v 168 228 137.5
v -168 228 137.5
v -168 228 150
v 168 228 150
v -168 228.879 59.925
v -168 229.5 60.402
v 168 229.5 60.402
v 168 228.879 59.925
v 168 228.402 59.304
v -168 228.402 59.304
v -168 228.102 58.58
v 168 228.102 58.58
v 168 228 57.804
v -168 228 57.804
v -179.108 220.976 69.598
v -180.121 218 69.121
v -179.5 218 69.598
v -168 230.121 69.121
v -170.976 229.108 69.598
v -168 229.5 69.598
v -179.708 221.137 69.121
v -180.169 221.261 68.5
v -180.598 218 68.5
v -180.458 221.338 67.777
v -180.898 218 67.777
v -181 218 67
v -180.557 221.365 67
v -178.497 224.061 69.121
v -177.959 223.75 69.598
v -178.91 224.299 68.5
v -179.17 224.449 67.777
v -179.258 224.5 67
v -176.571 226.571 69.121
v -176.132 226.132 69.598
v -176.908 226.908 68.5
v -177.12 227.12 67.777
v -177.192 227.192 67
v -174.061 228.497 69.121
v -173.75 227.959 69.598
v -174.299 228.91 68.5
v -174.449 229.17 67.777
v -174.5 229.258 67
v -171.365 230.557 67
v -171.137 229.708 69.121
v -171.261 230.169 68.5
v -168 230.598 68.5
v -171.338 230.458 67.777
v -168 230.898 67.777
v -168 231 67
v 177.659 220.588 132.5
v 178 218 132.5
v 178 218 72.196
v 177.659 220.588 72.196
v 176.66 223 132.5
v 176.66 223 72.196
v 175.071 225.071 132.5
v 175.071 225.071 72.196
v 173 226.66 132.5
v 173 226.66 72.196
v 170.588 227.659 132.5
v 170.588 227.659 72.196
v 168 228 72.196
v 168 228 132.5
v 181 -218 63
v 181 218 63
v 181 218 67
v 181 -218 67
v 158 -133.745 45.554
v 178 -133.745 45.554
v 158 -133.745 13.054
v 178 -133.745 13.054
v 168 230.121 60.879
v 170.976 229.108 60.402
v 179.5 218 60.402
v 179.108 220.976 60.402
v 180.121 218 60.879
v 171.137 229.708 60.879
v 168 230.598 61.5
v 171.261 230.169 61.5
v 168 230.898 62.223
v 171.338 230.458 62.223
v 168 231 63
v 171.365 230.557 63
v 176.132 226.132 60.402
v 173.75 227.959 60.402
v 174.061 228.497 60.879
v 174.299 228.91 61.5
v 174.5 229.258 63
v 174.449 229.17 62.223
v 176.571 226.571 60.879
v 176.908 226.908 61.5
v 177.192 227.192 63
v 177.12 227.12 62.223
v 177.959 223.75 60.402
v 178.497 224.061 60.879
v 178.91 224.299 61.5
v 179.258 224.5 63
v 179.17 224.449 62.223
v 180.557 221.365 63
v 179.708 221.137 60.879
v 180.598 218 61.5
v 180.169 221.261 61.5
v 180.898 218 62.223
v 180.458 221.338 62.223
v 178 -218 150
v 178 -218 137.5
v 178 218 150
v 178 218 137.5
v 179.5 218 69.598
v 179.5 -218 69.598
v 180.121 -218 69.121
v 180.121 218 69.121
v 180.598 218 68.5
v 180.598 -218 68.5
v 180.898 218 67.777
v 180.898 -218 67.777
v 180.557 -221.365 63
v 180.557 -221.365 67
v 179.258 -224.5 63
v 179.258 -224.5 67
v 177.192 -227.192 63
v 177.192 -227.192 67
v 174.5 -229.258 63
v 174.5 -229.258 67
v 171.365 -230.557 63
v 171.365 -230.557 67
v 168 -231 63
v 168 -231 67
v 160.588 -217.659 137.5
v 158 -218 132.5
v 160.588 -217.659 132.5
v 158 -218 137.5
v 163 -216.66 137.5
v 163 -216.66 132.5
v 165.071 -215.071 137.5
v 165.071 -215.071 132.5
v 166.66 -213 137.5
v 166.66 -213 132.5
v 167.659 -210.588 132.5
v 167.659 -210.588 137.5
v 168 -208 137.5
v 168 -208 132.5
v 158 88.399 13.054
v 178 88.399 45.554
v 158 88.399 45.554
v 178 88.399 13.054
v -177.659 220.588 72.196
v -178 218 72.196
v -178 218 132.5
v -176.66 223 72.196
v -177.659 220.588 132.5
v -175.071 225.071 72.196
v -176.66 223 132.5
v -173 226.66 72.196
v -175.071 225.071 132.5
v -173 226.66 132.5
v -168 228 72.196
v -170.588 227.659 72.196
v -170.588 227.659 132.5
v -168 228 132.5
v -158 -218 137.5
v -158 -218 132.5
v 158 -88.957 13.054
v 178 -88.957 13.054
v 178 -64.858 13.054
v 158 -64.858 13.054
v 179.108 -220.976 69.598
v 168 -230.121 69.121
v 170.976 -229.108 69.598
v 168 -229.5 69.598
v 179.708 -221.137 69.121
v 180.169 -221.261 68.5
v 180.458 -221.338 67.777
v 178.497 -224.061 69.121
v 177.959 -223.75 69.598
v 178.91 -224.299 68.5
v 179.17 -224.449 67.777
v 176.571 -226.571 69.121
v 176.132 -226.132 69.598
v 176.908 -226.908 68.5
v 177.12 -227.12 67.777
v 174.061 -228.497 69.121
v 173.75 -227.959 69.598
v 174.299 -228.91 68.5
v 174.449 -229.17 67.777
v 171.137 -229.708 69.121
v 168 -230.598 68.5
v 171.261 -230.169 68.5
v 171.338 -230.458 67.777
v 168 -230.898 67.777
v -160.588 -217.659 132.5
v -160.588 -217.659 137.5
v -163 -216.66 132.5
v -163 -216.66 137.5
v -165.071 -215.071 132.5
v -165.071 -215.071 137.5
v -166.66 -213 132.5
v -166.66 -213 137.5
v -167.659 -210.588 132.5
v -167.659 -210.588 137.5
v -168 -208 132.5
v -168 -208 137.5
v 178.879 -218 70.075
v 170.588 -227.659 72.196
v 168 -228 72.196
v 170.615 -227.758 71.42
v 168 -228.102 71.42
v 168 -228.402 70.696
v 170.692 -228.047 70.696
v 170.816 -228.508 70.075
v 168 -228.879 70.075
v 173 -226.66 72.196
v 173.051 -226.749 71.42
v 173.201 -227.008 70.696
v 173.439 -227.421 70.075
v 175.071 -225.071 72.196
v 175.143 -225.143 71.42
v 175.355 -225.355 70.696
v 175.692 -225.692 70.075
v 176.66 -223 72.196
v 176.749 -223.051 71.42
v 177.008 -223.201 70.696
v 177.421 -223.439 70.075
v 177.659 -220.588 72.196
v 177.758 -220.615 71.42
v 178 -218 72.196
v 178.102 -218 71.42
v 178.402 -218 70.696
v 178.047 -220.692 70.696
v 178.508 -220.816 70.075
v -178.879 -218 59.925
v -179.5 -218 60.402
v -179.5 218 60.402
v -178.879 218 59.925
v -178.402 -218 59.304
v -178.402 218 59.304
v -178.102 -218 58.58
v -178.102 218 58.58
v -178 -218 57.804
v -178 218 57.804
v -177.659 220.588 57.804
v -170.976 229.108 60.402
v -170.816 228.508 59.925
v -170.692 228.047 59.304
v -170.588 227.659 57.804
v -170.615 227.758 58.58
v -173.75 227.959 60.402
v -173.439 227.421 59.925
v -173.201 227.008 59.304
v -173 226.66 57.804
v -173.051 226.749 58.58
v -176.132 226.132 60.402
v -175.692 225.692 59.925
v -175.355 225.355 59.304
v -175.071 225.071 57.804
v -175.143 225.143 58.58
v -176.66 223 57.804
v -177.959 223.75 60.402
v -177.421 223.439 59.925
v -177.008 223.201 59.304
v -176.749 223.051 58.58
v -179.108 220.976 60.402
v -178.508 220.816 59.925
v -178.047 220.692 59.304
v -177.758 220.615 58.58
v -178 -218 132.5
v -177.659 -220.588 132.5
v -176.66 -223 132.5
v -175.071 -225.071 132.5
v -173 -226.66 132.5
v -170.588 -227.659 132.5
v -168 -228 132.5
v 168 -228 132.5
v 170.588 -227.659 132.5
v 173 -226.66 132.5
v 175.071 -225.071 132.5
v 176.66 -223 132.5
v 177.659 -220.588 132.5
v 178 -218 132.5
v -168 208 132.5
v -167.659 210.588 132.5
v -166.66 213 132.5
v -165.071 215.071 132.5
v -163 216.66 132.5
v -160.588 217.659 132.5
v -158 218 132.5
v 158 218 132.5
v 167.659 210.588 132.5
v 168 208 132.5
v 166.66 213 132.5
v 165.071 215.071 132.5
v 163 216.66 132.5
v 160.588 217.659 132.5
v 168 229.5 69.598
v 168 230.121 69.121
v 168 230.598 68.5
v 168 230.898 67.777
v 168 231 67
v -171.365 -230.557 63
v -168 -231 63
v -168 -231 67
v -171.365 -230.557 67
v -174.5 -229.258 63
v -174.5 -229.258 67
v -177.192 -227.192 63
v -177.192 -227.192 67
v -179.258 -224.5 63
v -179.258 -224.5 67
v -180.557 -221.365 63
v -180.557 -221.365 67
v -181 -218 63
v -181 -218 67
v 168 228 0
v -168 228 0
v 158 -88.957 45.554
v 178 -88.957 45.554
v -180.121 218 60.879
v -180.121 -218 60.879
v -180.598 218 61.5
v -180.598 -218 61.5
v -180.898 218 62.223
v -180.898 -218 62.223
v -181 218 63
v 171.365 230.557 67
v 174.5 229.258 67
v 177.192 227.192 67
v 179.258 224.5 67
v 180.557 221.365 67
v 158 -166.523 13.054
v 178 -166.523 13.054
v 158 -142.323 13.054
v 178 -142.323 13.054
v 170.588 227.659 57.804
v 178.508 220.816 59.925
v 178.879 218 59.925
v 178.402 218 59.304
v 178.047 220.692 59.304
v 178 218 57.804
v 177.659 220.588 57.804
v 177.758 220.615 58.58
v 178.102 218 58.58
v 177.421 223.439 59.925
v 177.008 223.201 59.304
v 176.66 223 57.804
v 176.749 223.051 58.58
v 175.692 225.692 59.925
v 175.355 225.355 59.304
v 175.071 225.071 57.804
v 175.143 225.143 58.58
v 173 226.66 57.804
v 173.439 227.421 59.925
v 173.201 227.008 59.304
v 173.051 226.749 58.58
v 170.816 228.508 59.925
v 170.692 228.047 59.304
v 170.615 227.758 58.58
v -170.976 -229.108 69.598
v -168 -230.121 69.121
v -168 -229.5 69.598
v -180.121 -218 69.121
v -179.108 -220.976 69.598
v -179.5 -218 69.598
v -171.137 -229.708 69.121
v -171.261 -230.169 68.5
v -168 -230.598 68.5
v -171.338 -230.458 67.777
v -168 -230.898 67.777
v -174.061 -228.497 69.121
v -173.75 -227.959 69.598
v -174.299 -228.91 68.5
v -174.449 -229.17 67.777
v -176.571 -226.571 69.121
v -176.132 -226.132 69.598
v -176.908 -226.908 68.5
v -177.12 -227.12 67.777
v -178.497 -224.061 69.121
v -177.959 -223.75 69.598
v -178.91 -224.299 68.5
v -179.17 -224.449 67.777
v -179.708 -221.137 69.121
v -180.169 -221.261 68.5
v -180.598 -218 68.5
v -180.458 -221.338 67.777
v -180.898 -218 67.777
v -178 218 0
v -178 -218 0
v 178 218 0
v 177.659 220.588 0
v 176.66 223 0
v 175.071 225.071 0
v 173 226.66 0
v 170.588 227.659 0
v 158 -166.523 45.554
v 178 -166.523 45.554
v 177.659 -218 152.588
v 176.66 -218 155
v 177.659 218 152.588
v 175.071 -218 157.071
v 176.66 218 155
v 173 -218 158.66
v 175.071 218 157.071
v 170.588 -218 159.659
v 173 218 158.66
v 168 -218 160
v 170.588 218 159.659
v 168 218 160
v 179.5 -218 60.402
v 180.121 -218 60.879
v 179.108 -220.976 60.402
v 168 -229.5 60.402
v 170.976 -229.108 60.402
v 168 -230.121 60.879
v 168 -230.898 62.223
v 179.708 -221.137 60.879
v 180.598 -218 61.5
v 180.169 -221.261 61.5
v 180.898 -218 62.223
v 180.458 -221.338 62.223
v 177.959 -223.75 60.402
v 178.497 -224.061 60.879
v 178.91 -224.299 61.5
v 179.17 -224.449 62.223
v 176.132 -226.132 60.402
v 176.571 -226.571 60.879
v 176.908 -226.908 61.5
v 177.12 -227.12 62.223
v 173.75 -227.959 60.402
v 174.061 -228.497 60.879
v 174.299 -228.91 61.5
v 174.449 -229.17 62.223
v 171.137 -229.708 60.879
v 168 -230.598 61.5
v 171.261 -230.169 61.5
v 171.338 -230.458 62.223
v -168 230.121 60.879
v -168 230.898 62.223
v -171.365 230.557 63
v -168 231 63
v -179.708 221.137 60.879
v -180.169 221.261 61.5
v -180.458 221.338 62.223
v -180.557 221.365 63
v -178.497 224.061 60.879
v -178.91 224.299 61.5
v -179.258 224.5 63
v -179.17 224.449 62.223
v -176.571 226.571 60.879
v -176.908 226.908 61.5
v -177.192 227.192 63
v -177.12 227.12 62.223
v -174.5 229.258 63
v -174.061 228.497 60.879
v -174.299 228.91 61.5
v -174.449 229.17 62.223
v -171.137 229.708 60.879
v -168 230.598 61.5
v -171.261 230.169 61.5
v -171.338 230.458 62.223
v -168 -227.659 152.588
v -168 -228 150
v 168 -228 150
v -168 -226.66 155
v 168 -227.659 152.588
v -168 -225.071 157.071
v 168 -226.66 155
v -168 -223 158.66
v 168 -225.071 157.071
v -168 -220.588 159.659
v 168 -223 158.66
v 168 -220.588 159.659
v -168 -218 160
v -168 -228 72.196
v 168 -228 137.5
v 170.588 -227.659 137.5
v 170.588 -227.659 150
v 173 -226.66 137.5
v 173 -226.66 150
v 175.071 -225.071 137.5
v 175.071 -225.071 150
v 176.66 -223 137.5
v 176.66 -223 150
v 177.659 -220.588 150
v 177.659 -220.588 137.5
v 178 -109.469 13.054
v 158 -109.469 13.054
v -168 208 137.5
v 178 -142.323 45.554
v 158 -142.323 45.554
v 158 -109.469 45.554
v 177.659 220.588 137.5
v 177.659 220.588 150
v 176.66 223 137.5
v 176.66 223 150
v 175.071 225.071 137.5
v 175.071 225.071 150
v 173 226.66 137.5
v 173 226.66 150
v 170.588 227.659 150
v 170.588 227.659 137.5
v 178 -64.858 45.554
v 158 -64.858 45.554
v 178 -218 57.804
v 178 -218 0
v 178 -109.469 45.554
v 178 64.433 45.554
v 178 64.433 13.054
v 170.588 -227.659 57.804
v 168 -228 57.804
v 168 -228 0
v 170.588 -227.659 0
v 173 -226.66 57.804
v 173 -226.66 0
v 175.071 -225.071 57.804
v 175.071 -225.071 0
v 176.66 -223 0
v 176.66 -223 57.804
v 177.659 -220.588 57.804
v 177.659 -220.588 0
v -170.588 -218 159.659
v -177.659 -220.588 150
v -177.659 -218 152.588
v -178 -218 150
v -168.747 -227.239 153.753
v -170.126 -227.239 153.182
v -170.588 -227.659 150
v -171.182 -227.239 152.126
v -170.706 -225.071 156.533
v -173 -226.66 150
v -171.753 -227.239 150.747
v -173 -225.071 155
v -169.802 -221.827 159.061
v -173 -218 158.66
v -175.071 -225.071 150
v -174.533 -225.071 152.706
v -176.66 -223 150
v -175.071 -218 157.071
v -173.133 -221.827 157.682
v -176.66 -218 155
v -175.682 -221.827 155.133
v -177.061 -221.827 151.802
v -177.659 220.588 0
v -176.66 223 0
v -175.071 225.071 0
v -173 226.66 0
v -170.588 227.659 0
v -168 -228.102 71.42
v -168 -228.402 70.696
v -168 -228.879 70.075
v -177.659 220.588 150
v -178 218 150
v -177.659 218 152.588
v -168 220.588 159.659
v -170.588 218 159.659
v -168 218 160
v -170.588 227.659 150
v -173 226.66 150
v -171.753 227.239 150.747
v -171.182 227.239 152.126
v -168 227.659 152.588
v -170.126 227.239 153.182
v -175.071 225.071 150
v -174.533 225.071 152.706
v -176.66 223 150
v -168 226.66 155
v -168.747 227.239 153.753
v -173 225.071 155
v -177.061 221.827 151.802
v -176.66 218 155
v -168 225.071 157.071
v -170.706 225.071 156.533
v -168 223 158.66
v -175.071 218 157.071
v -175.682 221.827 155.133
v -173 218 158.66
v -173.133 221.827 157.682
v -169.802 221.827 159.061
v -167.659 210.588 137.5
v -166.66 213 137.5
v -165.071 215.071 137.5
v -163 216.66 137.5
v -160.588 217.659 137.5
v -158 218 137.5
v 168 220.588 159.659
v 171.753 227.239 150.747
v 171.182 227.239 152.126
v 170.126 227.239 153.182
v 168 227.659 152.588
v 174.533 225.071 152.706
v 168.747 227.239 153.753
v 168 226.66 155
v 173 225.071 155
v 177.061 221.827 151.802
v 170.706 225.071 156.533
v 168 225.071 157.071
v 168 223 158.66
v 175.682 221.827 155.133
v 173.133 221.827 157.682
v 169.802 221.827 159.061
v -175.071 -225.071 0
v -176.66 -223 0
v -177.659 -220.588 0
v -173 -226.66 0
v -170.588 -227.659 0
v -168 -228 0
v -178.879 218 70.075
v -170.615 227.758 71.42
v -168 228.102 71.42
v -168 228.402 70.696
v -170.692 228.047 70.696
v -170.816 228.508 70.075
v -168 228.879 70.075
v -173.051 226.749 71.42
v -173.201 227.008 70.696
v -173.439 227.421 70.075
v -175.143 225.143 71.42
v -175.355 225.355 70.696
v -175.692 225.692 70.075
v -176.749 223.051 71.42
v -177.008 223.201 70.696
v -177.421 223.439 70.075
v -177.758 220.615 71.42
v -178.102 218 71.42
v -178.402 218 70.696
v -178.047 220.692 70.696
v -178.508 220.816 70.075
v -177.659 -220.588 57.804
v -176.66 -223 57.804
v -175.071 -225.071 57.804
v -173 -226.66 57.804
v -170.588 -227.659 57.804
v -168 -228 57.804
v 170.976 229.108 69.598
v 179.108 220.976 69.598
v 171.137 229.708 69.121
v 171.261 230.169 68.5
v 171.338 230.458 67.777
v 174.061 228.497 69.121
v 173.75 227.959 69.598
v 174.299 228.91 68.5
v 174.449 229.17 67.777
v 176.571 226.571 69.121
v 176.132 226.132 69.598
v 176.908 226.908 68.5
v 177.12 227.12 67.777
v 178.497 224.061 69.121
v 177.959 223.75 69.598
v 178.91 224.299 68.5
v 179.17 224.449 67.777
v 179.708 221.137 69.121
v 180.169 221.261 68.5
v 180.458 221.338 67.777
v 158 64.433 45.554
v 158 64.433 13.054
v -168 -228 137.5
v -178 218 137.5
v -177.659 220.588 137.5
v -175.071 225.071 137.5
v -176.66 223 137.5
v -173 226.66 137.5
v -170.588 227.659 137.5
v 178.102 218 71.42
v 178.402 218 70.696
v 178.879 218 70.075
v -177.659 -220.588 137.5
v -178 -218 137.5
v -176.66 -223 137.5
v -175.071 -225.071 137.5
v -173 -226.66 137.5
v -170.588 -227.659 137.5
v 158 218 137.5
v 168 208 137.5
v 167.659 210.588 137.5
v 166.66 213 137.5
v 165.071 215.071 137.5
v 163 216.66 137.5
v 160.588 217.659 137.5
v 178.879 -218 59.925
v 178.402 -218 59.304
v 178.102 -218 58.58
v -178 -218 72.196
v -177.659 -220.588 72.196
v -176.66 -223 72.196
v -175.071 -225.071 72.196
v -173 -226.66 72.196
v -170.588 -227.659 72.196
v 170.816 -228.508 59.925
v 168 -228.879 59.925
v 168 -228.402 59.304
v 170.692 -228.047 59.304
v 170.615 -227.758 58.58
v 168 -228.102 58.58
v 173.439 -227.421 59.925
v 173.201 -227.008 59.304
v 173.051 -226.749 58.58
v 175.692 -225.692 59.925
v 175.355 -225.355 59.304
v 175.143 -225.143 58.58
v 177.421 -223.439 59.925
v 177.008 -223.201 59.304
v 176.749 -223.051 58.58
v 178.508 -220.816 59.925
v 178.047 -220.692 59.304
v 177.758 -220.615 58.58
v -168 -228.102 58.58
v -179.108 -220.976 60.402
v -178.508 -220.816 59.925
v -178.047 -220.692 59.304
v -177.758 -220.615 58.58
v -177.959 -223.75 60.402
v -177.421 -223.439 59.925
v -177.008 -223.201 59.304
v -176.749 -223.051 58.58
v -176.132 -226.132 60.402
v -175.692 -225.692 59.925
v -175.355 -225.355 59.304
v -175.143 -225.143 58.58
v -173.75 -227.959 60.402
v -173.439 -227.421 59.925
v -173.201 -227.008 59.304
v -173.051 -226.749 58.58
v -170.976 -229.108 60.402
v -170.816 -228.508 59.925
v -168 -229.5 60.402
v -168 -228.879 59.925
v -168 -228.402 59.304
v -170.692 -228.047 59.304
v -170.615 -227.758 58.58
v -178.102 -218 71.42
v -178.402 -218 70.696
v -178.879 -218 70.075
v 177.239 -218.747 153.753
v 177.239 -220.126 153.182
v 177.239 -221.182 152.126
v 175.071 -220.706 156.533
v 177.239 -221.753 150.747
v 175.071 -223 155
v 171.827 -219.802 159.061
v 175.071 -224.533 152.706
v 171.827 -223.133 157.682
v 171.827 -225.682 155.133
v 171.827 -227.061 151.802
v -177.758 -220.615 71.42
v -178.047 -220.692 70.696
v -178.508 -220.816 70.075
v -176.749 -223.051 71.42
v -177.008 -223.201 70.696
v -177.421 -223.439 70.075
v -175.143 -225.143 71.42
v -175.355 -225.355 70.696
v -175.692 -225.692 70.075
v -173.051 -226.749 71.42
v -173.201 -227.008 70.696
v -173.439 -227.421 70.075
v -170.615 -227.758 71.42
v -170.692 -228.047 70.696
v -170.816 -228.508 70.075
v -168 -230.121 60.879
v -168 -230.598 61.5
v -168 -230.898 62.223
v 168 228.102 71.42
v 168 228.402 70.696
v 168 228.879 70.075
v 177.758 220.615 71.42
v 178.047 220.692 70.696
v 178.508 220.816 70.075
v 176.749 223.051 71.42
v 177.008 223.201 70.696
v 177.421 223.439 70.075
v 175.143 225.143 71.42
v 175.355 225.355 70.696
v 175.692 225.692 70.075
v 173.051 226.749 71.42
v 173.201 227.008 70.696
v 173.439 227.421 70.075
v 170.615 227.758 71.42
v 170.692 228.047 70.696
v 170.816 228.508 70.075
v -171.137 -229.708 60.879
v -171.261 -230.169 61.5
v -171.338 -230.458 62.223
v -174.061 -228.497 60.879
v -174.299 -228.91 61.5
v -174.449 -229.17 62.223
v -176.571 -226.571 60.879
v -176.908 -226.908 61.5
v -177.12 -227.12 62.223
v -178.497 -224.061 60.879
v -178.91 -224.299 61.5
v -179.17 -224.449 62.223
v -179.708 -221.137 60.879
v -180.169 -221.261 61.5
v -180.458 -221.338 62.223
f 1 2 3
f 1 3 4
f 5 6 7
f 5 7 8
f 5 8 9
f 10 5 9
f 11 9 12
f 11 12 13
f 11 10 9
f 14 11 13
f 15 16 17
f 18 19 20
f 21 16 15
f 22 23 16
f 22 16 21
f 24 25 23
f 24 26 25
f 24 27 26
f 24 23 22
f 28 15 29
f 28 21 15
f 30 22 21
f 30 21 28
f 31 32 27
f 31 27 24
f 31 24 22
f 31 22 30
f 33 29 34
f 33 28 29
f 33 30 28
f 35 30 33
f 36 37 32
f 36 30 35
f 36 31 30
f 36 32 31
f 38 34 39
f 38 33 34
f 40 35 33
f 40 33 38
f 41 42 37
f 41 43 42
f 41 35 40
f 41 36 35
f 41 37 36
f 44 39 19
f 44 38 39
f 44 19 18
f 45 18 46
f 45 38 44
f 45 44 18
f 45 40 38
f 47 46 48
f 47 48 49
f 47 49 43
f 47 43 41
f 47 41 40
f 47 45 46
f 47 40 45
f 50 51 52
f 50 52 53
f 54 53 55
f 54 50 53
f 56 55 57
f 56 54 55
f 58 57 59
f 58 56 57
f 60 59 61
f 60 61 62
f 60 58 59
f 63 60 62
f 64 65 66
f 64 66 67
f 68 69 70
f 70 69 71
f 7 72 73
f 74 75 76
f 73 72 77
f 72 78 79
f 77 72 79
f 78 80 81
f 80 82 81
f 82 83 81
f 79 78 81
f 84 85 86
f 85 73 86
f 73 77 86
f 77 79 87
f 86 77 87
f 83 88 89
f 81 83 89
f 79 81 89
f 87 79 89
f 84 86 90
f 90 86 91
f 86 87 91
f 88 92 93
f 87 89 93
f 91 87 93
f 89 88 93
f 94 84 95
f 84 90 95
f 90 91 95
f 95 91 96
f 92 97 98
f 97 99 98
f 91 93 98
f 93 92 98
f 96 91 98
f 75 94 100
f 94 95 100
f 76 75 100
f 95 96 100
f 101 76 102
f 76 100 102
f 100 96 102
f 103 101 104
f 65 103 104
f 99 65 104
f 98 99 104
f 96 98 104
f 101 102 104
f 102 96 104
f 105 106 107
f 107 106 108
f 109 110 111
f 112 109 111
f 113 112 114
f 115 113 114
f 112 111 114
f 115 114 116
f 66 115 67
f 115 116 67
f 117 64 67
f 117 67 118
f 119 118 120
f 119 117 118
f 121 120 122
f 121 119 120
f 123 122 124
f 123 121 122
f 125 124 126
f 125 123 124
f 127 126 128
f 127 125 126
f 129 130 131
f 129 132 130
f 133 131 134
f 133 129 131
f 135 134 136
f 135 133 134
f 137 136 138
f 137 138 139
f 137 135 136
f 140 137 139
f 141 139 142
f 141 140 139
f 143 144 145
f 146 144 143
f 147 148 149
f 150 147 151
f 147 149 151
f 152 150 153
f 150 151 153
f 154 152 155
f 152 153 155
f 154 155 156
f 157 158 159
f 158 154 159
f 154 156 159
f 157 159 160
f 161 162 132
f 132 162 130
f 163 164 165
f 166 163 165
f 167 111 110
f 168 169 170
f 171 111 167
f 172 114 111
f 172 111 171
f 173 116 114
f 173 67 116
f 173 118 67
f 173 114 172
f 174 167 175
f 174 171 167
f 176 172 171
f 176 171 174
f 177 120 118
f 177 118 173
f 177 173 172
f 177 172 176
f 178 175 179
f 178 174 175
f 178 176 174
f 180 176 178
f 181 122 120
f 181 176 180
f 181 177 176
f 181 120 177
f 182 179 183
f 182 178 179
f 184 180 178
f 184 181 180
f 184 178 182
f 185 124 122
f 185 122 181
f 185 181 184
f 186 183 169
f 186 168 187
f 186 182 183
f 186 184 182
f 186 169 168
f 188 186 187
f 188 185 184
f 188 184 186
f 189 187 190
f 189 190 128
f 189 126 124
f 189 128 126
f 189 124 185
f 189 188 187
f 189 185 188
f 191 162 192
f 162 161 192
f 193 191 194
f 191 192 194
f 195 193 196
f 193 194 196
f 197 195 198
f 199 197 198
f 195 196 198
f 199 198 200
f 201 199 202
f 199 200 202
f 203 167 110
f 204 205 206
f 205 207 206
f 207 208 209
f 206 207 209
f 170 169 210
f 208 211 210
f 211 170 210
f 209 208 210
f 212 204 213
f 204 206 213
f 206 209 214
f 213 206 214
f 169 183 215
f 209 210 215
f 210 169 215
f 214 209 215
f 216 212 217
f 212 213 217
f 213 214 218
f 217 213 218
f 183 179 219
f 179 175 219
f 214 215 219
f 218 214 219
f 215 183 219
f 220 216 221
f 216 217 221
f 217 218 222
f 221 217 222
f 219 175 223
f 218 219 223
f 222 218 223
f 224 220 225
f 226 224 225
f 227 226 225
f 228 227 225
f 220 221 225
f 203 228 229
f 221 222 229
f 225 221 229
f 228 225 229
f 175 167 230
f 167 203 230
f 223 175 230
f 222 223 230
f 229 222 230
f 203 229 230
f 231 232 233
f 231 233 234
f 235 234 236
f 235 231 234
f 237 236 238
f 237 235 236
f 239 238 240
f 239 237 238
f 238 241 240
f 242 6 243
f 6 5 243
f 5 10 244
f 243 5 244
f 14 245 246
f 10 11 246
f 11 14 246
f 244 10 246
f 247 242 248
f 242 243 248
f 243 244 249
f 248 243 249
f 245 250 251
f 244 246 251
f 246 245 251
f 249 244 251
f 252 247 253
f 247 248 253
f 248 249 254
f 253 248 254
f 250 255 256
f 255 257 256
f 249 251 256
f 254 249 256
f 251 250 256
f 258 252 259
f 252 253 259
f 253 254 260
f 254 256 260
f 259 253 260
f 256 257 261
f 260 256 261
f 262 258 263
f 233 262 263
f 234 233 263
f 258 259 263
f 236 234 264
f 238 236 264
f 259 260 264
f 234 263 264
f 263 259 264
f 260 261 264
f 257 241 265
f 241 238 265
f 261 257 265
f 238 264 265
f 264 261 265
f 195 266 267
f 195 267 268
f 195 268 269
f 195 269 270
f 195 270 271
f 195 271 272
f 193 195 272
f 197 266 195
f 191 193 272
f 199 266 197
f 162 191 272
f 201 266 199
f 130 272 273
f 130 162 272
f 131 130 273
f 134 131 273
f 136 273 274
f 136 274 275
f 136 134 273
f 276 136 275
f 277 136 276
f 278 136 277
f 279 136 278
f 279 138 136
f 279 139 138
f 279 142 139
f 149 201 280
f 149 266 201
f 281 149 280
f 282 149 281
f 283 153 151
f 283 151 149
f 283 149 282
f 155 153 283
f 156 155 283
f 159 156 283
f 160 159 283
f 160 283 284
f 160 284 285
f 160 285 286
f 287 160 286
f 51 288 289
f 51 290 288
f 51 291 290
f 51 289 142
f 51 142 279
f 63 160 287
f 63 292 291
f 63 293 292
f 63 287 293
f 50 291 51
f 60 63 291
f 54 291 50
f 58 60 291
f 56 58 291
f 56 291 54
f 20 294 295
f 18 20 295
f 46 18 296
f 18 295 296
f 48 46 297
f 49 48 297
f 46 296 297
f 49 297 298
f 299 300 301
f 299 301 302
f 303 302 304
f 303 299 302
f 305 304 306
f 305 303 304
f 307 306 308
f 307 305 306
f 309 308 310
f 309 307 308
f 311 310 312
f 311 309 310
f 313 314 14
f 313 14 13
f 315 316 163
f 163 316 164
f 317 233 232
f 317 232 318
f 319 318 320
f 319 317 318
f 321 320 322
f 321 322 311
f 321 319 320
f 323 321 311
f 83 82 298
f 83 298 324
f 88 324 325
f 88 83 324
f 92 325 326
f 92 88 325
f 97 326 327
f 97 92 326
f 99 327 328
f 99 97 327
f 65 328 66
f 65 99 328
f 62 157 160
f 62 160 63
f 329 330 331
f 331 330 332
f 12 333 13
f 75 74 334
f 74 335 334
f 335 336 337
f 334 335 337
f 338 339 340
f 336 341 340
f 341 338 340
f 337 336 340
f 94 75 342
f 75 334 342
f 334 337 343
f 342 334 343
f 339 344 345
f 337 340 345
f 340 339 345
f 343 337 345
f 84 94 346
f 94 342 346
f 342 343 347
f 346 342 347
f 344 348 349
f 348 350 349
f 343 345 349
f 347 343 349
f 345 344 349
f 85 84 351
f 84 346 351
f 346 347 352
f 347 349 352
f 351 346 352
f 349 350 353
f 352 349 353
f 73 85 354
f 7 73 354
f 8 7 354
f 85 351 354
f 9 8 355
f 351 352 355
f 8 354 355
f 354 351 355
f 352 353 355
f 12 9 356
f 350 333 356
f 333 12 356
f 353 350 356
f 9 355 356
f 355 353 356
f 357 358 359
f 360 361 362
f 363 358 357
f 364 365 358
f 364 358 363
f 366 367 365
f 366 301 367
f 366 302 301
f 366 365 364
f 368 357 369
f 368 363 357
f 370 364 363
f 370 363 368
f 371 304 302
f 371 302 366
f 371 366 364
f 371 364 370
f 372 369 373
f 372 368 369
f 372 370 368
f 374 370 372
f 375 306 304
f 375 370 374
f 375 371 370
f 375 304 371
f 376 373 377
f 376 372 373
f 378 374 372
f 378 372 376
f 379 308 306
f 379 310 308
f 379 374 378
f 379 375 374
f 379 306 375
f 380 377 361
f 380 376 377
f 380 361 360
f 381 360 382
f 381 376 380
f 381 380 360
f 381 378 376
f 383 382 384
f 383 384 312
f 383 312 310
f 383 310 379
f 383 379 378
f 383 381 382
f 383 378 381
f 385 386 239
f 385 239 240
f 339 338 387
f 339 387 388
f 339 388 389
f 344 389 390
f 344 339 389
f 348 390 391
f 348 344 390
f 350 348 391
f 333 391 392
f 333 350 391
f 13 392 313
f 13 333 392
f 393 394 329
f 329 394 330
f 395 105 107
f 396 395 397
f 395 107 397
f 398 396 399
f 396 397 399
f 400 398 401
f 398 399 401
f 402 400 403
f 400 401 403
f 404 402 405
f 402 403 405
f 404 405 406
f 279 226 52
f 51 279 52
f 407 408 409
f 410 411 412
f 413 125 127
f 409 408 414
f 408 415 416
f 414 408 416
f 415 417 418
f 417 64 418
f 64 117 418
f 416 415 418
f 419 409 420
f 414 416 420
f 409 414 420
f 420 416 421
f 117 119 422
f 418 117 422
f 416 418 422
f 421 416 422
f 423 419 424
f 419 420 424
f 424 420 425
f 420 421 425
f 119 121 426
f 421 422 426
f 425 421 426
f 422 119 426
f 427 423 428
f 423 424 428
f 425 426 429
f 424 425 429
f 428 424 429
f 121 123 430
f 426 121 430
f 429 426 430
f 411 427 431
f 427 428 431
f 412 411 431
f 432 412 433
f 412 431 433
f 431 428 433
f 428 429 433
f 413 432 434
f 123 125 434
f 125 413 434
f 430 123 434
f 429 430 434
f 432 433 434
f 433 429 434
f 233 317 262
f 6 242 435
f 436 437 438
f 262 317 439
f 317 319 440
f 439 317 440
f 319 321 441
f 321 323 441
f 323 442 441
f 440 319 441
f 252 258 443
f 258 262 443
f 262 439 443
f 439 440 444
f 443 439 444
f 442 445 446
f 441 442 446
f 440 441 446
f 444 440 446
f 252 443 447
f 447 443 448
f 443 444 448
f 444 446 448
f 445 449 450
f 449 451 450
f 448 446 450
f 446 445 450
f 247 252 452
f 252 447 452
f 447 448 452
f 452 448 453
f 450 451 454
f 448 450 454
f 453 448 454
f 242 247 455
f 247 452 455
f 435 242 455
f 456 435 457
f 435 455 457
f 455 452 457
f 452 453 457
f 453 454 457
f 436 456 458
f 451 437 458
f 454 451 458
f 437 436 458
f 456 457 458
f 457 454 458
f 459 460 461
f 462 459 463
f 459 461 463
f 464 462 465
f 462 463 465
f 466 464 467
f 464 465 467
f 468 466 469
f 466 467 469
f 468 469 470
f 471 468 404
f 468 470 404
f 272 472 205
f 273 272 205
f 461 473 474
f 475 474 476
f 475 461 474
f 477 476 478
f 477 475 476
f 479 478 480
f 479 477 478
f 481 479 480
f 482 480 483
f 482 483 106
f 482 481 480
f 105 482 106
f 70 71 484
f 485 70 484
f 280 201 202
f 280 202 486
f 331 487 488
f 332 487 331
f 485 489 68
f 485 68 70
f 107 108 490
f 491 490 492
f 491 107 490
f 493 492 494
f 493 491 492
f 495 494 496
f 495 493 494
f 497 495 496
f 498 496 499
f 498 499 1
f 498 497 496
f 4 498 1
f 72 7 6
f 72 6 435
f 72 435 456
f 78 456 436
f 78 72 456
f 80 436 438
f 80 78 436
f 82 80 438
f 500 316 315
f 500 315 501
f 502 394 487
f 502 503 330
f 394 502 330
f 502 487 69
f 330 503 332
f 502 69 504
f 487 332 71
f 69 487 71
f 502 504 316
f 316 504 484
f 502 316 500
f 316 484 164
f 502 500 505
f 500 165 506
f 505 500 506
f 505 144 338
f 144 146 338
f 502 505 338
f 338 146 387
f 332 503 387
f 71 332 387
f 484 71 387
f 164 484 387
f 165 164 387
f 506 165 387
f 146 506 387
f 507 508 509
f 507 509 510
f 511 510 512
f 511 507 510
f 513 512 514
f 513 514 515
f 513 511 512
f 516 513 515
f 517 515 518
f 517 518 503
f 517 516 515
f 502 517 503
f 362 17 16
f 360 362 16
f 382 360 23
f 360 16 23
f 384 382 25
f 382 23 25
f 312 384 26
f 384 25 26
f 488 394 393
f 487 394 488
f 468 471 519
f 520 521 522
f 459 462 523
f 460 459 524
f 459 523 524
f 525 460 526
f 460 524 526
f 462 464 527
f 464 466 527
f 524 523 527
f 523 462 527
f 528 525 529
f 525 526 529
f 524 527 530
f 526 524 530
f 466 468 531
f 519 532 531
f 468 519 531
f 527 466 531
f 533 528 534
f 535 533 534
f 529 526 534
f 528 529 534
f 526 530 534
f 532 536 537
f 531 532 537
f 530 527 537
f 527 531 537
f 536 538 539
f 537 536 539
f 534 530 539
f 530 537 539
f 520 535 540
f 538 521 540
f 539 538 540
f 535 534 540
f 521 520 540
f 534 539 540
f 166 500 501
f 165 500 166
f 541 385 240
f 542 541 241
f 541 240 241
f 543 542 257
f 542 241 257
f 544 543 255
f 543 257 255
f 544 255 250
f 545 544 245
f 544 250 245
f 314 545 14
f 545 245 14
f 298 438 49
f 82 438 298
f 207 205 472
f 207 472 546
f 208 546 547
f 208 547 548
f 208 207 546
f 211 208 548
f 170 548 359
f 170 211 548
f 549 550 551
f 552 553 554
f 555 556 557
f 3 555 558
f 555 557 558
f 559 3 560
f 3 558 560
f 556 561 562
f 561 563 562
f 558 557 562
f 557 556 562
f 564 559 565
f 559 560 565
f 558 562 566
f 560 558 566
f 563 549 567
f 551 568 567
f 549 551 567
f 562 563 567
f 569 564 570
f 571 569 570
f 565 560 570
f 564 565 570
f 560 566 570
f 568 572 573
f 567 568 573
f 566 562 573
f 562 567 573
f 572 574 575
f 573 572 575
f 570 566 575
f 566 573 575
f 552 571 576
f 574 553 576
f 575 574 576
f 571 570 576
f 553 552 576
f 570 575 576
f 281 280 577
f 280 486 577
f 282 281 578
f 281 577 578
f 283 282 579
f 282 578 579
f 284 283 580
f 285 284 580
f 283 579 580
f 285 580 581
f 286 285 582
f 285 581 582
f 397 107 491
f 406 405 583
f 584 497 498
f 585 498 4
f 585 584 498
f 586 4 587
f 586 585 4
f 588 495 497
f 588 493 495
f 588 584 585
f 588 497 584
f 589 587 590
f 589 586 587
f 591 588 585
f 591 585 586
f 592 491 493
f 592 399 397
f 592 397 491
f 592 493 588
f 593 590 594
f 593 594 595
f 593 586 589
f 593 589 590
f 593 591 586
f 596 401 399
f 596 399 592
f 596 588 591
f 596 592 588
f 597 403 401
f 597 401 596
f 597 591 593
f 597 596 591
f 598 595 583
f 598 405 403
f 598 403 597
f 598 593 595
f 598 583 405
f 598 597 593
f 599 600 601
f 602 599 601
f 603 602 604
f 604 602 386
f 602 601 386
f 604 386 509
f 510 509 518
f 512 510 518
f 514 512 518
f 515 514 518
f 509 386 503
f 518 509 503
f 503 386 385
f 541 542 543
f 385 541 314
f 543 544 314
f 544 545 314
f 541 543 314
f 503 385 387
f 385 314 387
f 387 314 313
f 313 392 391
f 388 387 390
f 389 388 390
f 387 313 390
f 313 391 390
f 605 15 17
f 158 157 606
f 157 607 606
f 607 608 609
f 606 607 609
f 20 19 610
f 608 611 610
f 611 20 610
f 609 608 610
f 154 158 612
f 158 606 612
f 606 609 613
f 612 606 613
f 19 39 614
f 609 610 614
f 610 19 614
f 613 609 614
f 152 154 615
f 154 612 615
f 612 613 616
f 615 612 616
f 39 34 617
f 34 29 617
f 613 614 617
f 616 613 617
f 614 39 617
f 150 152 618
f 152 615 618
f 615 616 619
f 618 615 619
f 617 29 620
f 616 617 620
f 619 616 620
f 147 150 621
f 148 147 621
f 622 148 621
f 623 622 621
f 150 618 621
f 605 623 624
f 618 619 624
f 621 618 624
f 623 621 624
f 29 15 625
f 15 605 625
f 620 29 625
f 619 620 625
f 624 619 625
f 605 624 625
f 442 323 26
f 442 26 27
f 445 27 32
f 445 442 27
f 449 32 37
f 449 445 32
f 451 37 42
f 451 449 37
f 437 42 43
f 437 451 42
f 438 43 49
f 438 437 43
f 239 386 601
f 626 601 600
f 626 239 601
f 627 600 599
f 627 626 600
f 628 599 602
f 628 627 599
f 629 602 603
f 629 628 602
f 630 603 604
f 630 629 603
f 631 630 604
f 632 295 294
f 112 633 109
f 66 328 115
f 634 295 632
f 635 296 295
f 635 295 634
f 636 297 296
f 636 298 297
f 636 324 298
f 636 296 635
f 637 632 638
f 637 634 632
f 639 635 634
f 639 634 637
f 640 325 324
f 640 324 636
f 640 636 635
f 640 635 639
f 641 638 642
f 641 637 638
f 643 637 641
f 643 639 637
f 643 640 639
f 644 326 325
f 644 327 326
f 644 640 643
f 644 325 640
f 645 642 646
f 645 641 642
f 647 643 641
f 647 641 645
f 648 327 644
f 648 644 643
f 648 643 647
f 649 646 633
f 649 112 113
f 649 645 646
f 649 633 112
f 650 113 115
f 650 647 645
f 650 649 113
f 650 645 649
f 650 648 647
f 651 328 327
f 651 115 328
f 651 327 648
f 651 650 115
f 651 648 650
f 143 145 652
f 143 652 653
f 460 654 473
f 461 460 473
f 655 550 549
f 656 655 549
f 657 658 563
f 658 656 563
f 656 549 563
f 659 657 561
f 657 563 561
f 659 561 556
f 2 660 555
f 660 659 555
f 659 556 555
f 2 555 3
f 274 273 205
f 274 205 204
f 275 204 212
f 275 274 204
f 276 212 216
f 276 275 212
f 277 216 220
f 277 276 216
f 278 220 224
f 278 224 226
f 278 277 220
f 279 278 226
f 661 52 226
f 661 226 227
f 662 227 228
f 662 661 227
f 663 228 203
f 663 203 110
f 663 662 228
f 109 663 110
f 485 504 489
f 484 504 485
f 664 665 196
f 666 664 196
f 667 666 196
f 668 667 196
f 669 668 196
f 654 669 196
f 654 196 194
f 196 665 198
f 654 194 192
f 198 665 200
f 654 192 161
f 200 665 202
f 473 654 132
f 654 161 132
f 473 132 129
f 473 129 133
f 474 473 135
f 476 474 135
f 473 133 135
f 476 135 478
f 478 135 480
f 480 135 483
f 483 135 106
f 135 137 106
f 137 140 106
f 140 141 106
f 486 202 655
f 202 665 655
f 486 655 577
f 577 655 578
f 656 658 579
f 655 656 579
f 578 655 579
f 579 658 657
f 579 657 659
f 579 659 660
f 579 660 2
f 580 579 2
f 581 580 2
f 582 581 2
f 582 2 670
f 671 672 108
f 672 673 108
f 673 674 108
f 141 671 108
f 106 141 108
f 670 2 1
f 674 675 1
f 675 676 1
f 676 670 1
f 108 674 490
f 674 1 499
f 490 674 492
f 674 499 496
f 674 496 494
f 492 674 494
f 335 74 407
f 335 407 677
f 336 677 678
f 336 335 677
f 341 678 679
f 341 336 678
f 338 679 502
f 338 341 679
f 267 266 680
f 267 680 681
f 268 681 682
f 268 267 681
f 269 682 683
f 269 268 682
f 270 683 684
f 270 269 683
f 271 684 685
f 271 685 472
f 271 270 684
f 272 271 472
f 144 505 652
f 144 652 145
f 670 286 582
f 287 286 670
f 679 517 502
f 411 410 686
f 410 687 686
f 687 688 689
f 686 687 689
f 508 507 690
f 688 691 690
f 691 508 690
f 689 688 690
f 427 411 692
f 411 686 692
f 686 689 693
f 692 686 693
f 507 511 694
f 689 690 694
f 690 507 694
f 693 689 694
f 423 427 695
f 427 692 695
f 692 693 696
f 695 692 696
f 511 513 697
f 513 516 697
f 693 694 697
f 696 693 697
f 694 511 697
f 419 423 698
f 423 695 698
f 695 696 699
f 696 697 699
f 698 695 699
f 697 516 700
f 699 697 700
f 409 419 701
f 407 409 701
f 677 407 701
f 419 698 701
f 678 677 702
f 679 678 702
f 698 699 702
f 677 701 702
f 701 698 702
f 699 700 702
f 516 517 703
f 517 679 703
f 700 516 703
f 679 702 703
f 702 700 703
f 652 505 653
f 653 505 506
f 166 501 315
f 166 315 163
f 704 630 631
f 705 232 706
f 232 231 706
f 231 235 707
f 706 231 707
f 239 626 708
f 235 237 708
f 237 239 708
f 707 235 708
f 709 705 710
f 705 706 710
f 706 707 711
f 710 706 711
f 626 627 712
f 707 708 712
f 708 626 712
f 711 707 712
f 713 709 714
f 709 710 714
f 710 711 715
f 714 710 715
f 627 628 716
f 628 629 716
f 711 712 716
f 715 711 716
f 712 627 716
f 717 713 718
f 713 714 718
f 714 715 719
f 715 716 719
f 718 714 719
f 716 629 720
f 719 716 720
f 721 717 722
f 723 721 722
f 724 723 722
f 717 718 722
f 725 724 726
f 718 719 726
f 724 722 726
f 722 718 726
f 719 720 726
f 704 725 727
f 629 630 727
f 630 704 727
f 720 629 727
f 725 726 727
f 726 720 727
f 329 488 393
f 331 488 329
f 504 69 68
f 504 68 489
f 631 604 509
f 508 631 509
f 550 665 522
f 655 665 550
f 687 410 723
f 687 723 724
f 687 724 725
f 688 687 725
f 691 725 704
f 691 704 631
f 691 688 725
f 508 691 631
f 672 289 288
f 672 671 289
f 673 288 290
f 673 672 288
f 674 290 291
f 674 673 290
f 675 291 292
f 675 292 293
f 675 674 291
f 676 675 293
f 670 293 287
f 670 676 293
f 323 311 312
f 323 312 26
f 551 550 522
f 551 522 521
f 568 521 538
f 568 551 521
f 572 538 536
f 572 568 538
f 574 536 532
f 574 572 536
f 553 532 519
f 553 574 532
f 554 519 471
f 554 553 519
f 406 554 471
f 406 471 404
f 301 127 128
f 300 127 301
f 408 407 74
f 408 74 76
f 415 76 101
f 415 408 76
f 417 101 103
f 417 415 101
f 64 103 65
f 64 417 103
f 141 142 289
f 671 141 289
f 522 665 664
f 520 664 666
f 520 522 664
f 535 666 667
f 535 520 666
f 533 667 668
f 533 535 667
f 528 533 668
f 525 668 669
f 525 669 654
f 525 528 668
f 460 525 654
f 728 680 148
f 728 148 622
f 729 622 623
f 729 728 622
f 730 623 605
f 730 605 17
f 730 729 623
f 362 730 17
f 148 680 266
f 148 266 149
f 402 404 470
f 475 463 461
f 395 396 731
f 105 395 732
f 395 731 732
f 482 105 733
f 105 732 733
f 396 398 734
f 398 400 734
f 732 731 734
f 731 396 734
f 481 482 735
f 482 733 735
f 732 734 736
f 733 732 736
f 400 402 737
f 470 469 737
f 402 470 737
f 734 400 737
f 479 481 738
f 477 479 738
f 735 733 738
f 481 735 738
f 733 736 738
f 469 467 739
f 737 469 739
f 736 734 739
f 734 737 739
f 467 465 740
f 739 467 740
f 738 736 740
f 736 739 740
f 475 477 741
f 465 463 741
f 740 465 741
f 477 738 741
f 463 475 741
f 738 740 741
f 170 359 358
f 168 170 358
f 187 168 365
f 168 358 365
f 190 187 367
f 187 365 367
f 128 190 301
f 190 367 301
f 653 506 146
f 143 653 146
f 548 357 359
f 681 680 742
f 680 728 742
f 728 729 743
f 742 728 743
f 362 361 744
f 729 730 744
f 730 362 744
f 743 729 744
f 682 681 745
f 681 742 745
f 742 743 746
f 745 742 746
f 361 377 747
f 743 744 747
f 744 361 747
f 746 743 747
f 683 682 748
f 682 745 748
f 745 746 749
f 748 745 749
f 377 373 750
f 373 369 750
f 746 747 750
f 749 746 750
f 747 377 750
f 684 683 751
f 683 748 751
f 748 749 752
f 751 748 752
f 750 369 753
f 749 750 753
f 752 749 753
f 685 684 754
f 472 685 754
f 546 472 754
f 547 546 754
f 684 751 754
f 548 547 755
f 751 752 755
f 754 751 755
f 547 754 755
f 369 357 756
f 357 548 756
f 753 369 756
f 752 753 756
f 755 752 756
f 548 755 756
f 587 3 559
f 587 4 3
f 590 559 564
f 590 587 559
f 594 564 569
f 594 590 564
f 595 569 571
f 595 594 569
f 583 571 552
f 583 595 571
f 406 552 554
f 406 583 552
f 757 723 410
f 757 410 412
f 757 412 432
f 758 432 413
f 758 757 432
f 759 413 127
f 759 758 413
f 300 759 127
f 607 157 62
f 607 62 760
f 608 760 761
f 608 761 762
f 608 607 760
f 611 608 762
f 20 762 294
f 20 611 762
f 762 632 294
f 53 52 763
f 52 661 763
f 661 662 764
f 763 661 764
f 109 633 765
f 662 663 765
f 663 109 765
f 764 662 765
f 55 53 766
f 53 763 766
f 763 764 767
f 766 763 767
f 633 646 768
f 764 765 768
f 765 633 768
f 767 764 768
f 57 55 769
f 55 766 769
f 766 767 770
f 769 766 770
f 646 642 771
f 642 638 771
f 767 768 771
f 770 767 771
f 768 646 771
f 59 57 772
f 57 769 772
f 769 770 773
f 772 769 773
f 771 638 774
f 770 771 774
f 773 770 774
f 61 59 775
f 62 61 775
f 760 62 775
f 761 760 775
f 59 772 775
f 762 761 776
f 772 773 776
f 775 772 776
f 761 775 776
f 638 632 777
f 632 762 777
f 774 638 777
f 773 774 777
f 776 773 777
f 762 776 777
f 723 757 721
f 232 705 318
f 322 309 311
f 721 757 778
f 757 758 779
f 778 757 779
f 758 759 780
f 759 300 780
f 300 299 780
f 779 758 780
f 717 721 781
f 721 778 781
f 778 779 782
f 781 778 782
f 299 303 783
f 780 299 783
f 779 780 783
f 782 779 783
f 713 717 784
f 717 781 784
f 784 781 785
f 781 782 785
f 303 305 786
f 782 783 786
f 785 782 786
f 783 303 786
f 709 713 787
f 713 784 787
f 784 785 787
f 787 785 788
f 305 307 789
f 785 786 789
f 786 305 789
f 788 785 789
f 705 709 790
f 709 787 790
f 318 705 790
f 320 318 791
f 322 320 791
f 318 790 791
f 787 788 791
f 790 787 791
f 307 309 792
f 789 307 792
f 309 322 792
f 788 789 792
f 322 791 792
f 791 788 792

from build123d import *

# Parameters (mm, degrees)
CROQUIS1_W                   = 356
CROQUIS1_H                   = 456
SALIENTE_EXTRUIR1_DEPTH      = 160
REDONDEO1_R                  = 10
CORTAR_EXTRUIR1_DEPTH        = 2.5
CORTAR_EXTRUIR1_DEPTH_BACK   = 2.5
CORTAR_EXTRUIR1_START        = -25
CROQUIS2_W                   = 356
CROQUIS2_H                   = 456
CROQUIS2_W_2                 = 336
CROQUIS2_H_2                 = 436
REDONDEO2_R                  = 10
SALIENTE_EXTRUIR2_DEPTH      = 5
SALIENTE_EXTRUIR2_DEPTH_BACK = 5
REDONDEO6_R                  = 3
REDONDEO7_R                  = 3
REDONDEO8_R                  = 3
CROQUIS5_W                   = 32.5
CROQUIS5_H                   = 24.2
CROQUIS5_H_2                 = 24.275971101
CROQUIS5_H_3                 = 24.099571128
CROQUIS5_H_4                 = 23.966296081
CORTAR_EXTRUIR2_DEPTH        = 20


# Some blends are built 0.0001 mm under size
with BuildPart() as part:
    # Croquis1 → Saliente-Extruir1 (new body)
    with BuildSketch(Plane.XY):
        Rectangle(CROQUIS1_W, CROQUIS1_H)
    extrude(amount=SALIENTE_EXTRUIR1_DEPTH)

    # Redondeo1
    redondeo1_edges = [part.edges().sort_by_distance(p)[0] for p in [
        (-178, 0, 160),
        (0, -228, 160),
        (178, 0, 160),
        (178, -228, 80),
        (-178, -228, 80),
        (-178, 228, 80),
        (178, 228, 80),
        (0, 228, 160),
    ]]
    fillet(redondeo1_edges, radius=REDONDEO1_R)

    # Croquis2 → Cortar-Extruir1 (cut, two sides: drawn at the far end of the back side and taken through both)
    with BuildSketch(Plane.XY.offset(160).offset(CORTAR_EXTRUIR1_START - CORTAR_EXTRUIR1_DEPTH_BACK)):
        Rectangle(CROQUIS2_W, CROQUIS2_H)
        Rectangle(CROQUIS2_W_2, CROQUIS2_H_2, mode=Mode.SUBTRACT)
    extrude(amount=CORTAR_EXTRUIR1_DEPTH + CORTAR_EXTRUIR1_DEPTH_BACK, mode=Mode.SUBTRACT)

    # Redondeo2
    redondeo2_edges = [part.edges().sort_by_distance(p)[0] for p in [
        (168, 218, 135),
        (-168, 218, 135),
        (-168, -218, 135),
        (168, -218, 135),
    ]]
    fillet(redondeo2_edges, radius=REDONDEO2_R)

    # Croquis4 → Saliente-Extruir2 (add, two sides: drawn at the far end of the back side and taken through both)
    with BuildSketch(Plane.XY.offset(65).offset(-SALIENTE_EXTRUIR2_DEPTH_BACK)):
        with BuildLine():
            Line((168, -231), (-168, -231))
            ThreePointArc((-168, -231), (-177.192388155, -227.192388155), (-181, -218))
            Line((-181, -218), (-181, 218))
            ThreePointArc((-181, 218), (-177.192388155, 227.192388155), (-168, 231))
            Line((-168, 231), (168, 231))
            ThreePointArc((168, 231), (177.192388155, 227.192388155), (181, 218))
            Line((181, 218), (181, -218))
            ThreePointArc((181, -218), (177.192388155, -227.192388155), (168, -231))
        make_face()
    extrude(amount=SALIENTE_EXTRUIR2_DEPTH + SALIENTE_EXTRUIR2_DEPTH_BACK)

    # Redondeo6
    redondeo6_edges = [part.edges().sort_by_distance(p)[0] for p in [
        (-177.192388155, 227.192388155, 70),
        (-181, 0, 70),
        (-177.192388155, -227.192388155, 70),
        (0, -231, 70),
        (177.192388155, -227.192388155, 70),
        (181, 0, 70),
        (177.192388155, 227.192388155, 70),
        (0, 231, 70),
        (-177.192388155, 227.192388155, 60),
        (0, 231, 60),
        (177.192388155, 227.192388155, 60),
        (181, 0, 60),
        (177.192388155, -227.192388155, 60),
        (0, -231, 60),
        (-177.192388155, -227.192388155, 60),
        (-181, 0, 60),
    ]]
    fillet(redondeo6_edges, radius=REDONDEO6_R - 0.0001)  # a hair under: the kernel refuses the full size

    # Redondeo7
    # the kernel refuses this fillet: 3 mm, written as the material it adds along each edge
    with BuildSketch(Plane(origin=(178, 218, 60), x_dir=(0.9659313848535178, 0, 0.25879829936644666), z_dir=(0, -1, 0)), Plane(origin=(-178, -218, 60), x_dir=(-0.9659313848535145, 0, 0.25879829936645976), z_dir=(0, 1, 0))) as redondeo7_piece_1:
        with BuildLine():
            CenterArc((2.329422704, -2.897768274), REDONDEO7_R, 105.000679234, 60.000551337)
            Line((-0.56837145, -2.121373376), (-0.858150866, -2.043733886))
            Line((-0.858150866, -2.043733886), (-0.289779415, 0.07763949))
            Line((-0.289779415, 0.07763949), (0.07763949, 0.289779415))
            ThreePointArc((0.07763949, 0.289779415), (0.077736083, 0.289753536), (1.475282068, 0.289776827))
            Line((1.475282068, 0.289776827), (1.552931216, 0))
        make_face()
    extrude(amount=436)
    with BuildSketch(Plane(origin=(-168, -218, 60), x_dir=(-1, 0, 0), z_dir=(0, 1, 0))) as redondeo7_piece_2:
        with BuildLine():
            CenterArc((13, -2.196194687), REDONDEO7_R, 119.999448663, 60.000551337)
            Line((10, -2.196194687), (9.7, -2.196194687))
            Line((9.7, -2.196194687), (9.7, 0))
            Line((9.7, 0), (10, 0.3))
            ThreePointArc((10, 0.3), (10.0001, 0.3), (11.3500275, 0.661705022))
            Line((11.3500275, 0.661705022), (11.500025, 0.401895958))
        make_face()
    revolve(axis=Axis((-168, -218, 60), (0, 0, 1)), revolution_arc=90)
    with BuildSketch(Plane(origin=(168, -218, 60), x_dir=(0, -1, 0), z_dir=(-1, 0, 0))) as redondeo7_piece_3:
        with BuildLine():
            CenterArc((13, -2.196194687), REDONDEO7_R, 119.999448663, 60.000551337)
            Line((10, -2.196194687), (9.7, -2.196194687))
            Line((9.7, -2.196194687), (9.7, 0))
            Line((9.7, 0), (10, 0.3))
            ThreePointArc((10, 0.3), (10.0001, 0.3), (11.3500275, 0.661705022))
            Line((11.3500275, 0.661705022), (11.500025, 0.401895958))
        make_face()
    revolve(axis=Axis((168, -218, 60), (0, 0, 1)), revolution_arc=90)
    with BuildSketch(Plane(origin=(168, 218, 60), x_dir=(1, 0, 0), z_dir=(0, -1, 0))) as redondeo7_piece_4:
        with BuildLine():
            CenterArc((13, -2.196194687), REDONDEO7_R, 119.999448663, 60.000551337)
            Line((10, -2.196194687), (9.7, -2.196194687))
            Line((9.7, -2.196194687), (9.7, 0))
            Line((9.7, 0), (10, 0.3))
            ThreePointArc((10, 0.3), (10.0001, 0.3), (11.3500275, 0.661705022))
            Line((11.3500275, 0.661705022), (11.500025, 0.401895958))
        make_face()
    revolve(axis=Axis((168, 218, 60), (0, 0, 1)), revolution_arc=90)
    with BuildSketch(Plane(origin=(-168, 218, 60), x_dir=(0, 1, 0), z_dir=(1, 0, 0))) as redondeo7_piece_5:
        with BuildLine():
            CenterArc((13, -2.196194687), REDONDEO7_R, 119.999448663, 60.000551337)
            Line((10, -2.196194687), (9.7, -2.196194687))
            Line((9.7, -2.196194687), (9.7, 0))
            Line((9.7, 0), (10, 0.3))
            ThreePointArc((10, 0.3), (10.0001, 0.3), (11.3500275, 0.661705022))
            Line((11.3500275, 0.661705022), (11.500025, 0.401895958))
        make_face()
    revolve(axis=Axis((-168, 218, 60), (0, 0, 1)), revolution_arc=90)
    with BuildSketch(Plane(origin=(-168, 228, 60), x_dir=(0, 0.9659313848535145, 0.25879829936645976), z_dir=(1, 0, 0)), Plane(origin=(168, -228, 60), x_dir=(0, -0.9659313848535215, 0.2587982993664339), z_dir=(-1, 0, 0))) as redondeo7_piece_6:
        with BuildLine():
            CenterArc((2.329422704, -2.897768274), REDONDEO7_R, 105.000679234, 60.000551337)
            Line((-0.56837145, -2.121373376), (-0.858150866, -2.043733886))
            Line((-0.858150866, -2.043733886), (-0.289779415, 0.07763949))
            Line((-0.289779415, 0.07763949), (0.07763949, 0.289779415))
            ThreePointArc((0.07763949, 0.289779415), (0.077736083, 0.289753536), (1.475282068, 0.289776827))
            Line((1.475282068, 0.289776827), (1.552931216, 0))
        make_face()
    extrude(amount=336)

    # Redondeo8
    # the kernel refuses this fillet: 3 mm, written as the material it adds along each edge
    with BuildSketch(Plane(origin=(178, 218, 70), x_dir=(0.965931384853519, 0, -0.2587982993664427), z_dir=(0, -1, 0)), Plane(origin=(-178, -218, 70), x_dir=(-0.9659313848535145, 0, -0.25879829936645976), z_dir=(0, 1, 0))) as redondeo8_piece_1:
        with BuildLine():
            CenterArc((2.329422704, 2.897768274), REDONDEO8_R, 194.99876943, 60.000551337)
            Line((-0.56837145, 2.121373376), (-0.858150866, 2.043733886))
            Line((-0.858150866, 2.043733886), (-0.289779415, -0.07763949))
            Line((-0.289779415, -0.07763949), (0.07763949, -0.289779415))
            ThreePointArc((0.07763949, -0.289779415), (0.077736083, -0.289753536), (1.475282068, -0.289776827))
            Line((1.475282068, -0.289776827), (1.552931216, 0))
        make_face()
    extrude(amount=436)
    with BuildSketch(Plane(origin=(-168, 228, 70), x_dir=(0, 0.9659313848535145, -0.25879829936645976), z_dir=(1, 0, 0)), Plane(origin=(168, -228, 70), x_dir=(0, -0.9659313848535178, -0.25879829936644666), z_dir=(-1, 0, 0))) as redondeo8_piece_2:
        with BuildLine():
            CenterArc((2.329422704, 2.897768274), REDONDEO8_R, 194.99876943, 60.000551337)
            Line((-0.56837145, 2.121373376), (-0.858150866, 2.043733886))
            Line((-0.858150866, 2.043733886), (-0.289779415, -0.07763949))
            Line((-0.289779415, -0.07763949), (0.07763949, -0.289779415))
            ThreePointArc((0.07763949, -0.289779415), (0.077736083, -0.289753536), (1.475282068, -0.289776827))
            Line((1.475282068, -0.289776827), (1.552931216, 0))
        make_face()
    extrude(amount=336)
    with BuildSketch(Plane(origin=(-168, -218, 70), x_dir=(-1, 0, 0), z_dir=(0, 1, 0))) as redondeo8_piece_3:
        with BuildLine():
            CenterArc((13, 2.196194687), REDONDEO8_R, 180, 60.000551337)
            Line((10, 2.196194687), (9.7, 2.196194687))
            Line((9.7, 2.196194687), (9.7, 0))
            Line((9.7, 0), (10, -0.3))
            ThreePointArc((10, -0.3), (10.0001, -0.3), (11.3500275, -0.661705022))
            Line((11.3500275, -0.661705022), (11.500025, -0.401895958))
        make_face()
    revolve(axis=Axis((-168, -218, 70), (0, 0, 1)), revolution_arc=90)
    with BuildSketch(Plane(origin=(168, -218, 70), x_dir=(0, -1, 0), z_dir=(-1, 0, 0))) as redondeo8_piece_4:
        with BuildLine():
            CenterArc((13, 2.196194687), REDONDEO8_R, 180, 60.000551337)
            Line((10, 2.196194687), (9.7, 2.196194687))
            Line((9.7, 2.196194687), (9.7, 0))
            Line((9.7, 0), (10, -0.3))
            ThreePointArc((10, -0.3), (10.0001, -0.3), (11.3500275, -0.661705022))
            Line((11.3500275, -0.661705022), (11.500025, -0.401895958))
        make_face()
    revolve(axis=Axis((168, -218, 70), (0, 0, 1)), revolution_arc=90)
    with BuildSketch(Plane(origin=(168, 218, 70), x_dir=(1, 0, 0), z_dir=(0, -1, 0))) as redondeo8_piece_5:
        with BuildLine():
            CenterArc((13, 2.196194687), REDONDEO8_R, 180, 60.000551337)
            Line((10, 2.196194687), (9.7, 2.196194687))
            Line((9.7, 2.196194687), (9.7, 0))
            Line((9.7, 0), (10, -0.3))
            ThreePointArc((10, -0.3), (10.0001, -0.3), (11.3500275, -0.661705022))
            Line((11.3500275, -0.661705022), (11.500025, -0.401895958))
        make_face()
    revolve(axis=Axis((168, 218, 70), (0, 0, 1)), revolution_arc=90)
    with BuildSketch(Plane(origin=(-168, 218, 70), x_dir=(0, 1, 0), z_dir=(1, 0, 0))) as redondeo8_piece_6:
        with BuildLine():
            CenterArc((13, 2.196194687), REDONDEO8_R, 180, 60.000551337)
            Line((10, 2.196194687), (9.7, 2.196194687))
            Line((9.7, 2.196194687), (9.7, 0))
            Line((9.7, 0), (10, -0.3))
            ThreePointArc((10, -0.3), (10.0001, -0.3), (11.3500275, -0.661705022))
            Line((11.3500275, -0.661705022), (11.500025, -0.401895958))
        make_face()
    revolve(axis=Axis((-168, 218, 70), (0, 0, 1)), revolution_arc=90)

    # Croquis5 → Cortar-Extruir2 (cut)
    with BuildSketch(Plane(origin=(178, 0, 0), x_dir=(0, 0, -1), z_dir=(1, 0, 0))):
        with Locations((-29.303847577, -154.422503433)):
            Rectangle(CROQUIS5_W, CROQUIS5_H)
        with Locations((-29.303847577, -121.606769627)):
            Rectangle(CROQUIS5_W, CROQUIS5_H_2)
        with Locations((-29.303847577, -76.907454446)):
            Rectangle(CROQUIS5_W, CROQUIS5_H_3)
        with Locations((-29.303847577, 76.415754786)):
            Rectangle(CROQUIS5_W, CROQUIS5_H_4)
    extrude(amount=-CORTAR_EXTRUIR2_DEPTH, mode=Mode.SUBTRACT)


solid = part.part
